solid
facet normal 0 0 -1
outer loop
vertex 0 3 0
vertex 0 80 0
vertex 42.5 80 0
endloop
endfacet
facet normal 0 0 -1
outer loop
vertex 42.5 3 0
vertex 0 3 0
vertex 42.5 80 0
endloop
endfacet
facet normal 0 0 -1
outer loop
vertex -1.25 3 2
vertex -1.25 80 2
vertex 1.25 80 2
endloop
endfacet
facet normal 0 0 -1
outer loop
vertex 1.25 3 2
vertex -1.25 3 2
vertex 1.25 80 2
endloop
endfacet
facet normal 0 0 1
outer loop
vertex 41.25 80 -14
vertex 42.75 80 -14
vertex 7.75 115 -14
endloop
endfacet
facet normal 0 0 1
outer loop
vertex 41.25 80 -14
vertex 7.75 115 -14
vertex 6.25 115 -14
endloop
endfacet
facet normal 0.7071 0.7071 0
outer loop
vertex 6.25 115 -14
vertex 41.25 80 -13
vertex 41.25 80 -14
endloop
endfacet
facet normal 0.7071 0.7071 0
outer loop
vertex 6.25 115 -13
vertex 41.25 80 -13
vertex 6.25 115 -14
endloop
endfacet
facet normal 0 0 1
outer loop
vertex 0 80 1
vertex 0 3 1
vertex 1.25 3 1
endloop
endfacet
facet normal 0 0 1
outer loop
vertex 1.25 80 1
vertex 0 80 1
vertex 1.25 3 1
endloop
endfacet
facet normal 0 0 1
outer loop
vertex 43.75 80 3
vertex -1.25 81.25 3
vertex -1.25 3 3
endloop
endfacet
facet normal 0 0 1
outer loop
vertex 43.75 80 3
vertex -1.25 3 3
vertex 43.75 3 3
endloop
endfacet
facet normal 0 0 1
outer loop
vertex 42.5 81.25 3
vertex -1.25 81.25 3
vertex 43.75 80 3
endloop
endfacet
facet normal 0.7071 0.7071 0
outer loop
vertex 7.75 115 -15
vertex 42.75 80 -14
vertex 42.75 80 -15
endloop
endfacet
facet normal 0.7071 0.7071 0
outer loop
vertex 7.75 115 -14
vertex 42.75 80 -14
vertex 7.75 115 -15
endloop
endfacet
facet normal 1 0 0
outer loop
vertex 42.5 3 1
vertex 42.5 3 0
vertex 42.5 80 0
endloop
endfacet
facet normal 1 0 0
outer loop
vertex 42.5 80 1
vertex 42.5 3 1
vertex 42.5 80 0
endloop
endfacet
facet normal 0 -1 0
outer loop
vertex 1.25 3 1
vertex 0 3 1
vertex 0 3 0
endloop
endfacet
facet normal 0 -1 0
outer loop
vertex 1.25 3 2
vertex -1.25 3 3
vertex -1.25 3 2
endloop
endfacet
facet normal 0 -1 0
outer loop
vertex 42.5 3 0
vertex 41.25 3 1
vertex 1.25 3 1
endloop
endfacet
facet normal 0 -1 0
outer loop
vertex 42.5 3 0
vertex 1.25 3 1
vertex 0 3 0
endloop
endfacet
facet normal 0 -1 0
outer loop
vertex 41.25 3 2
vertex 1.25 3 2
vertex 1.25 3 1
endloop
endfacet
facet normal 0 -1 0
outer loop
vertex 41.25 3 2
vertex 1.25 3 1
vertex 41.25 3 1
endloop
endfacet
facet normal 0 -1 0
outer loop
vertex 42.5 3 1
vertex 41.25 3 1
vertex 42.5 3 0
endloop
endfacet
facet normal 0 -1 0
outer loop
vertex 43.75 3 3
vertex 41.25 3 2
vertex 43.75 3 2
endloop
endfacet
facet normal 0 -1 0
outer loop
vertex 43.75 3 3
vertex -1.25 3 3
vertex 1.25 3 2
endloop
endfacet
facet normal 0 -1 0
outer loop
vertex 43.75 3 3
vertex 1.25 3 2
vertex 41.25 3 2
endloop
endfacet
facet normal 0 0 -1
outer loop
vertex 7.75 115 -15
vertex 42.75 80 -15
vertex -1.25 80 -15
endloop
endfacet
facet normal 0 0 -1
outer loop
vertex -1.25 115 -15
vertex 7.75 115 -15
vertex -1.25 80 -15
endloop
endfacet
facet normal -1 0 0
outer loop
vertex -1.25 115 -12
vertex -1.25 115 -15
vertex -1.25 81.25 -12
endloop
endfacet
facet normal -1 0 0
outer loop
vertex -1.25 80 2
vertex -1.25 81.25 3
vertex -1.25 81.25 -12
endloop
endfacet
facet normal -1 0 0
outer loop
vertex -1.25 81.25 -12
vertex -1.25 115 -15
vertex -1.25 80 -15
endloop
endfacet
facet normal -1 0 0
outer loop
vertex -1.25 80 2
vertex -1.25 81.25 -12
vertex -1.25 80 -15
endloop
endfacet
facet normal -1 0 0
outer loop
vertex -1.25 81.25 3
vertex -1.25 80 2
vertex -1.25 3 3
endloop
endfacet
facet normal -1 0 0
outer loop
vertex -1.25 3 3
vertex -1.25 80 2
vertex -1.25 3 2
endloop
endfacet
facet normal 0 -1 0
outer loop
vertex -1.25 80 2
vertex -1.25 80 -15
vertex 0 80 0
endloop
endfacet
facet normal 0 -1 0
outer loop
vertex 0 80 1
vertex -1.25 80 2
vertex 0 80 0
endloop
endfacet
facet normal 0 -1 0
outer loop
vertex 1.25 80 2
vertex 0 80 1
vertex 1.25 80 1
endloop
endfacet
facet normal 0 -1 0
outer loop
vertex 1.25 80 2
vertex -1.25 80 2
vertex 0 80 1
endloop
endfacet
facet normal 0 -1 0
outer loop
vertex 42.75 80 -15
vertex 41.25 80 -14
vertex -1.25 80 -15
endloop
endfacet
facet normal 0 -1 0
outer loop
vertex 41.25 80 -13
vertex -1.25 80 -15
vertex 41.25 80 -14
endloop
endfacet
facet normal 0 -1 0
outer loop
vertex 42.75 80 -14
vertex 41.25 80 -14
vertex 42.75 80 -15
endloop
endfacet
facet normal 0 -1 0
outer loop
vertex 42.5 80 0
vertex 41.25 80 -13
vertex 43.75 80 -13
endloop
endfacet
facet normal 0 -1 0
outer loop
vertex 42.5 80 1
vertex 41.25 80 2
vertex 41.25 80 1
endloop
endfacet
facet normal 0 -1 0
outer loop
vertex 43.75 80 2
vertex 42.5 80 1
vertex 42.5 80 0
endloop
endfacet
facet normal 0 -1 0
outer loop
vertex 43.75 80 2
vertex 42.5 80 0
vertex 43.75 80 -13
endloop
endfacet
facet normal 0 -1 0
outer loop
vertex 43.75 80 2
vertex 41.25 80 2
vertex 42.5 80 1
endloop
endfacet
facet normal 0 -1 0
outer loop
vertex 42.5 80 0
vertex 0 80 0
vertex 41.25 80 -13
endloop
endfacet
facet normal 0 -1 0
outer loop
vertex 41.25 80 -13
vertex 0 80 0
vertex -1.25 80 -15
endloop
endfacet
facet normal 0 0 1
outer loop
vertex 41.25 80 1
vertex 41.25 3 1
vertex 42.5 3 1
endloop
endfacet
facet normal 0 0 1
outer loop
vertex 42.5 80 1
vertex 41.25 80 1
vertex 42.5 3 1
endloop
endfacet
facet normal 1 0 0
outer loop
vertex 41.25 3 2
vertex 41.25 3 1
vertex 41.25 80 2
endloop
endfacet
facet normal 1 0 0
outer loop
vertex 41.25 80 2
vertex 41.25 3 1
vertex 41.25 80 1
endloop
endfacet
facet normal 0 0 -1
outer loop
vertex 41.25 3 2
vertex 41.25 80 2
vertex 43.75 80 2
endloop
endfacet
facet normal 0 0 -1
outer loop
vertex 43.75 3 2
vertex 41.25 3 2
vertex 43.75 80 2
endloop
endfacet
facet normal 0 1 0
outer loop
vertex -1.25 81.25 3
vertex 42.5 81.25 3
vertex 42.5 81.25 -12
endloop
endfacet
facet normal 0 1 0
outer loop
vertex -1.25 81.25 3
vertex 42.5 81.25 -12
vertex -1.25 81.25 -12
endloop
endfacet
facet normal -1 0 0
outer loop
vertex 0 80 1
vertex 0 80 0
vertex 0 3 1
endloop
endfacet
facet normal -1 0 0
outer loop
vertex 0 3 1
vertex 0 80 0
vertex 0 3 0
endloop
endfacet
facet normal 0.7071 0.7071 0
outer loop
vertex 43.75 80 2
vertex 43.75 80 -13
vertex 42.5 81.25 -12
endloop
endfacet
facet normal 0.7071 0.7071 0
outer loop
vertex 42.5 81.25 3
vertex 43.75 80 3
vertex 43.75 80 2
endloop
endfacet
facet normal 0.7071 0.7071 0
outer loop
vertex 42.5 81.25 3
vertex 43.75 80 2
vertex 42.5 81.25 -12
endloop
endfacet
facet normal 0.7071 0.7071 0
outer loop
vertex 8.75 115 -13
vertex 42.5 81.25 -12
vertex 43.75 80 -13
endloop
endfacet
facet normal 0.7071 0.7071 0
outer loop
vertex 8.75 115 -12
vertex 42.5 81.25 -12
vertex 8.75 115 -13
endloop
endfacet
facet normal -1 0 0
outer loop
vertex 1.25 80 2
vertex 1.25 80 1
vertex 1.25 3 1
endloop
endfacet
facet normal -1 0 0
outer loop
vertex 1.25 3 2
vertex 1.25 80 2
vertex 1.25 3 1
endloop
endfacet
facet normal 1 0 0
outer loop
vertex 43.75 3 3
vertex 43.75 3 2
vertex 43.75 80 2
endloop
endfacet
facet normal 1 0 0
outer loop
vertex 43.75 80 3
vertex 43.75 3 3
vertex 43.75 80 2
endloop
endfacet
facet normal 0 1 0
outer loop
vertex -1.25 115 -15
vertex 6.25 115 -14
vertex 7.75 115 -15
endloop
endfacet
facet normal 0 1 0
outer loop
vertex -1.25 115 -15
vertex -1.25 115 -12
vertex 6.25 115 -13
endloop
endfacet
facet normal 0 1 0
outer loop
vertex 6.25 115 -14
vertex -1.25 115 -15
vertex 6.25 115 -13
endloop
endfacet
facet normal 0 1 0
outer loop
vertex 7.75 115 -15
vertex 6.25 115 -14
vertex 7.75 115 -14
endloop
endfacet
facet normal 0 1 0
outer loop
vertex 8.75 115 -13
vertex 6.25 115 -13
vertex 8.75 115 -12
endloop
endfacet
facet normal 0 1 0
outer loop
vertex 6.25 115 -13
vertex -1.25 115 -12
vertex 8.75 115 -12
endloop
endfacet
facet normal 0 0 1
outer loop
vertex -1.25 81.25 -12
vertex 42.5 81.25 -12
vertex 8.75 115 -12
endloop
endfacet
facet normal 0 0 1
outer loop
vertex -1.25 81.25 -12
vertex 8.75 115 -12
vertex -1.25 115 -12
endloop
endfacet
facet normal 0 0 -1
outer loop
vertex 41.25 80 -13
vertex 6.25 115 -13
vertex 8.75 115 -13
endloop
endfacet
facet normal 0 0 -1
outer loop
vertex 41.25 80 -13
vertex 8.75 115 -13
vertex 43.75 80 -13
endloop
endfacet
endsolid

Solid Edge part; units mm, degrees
sketch "Sketch1" plane through (0, 0, 0) normal (0, 0, 1) x (1, 0, 0)
  line L0 (0, 0) -> (42.5, 0)
  line L1 (42.5, 0) -> (42.5, 80)
  line L2 (42.5, 80) -> (0, 80)
  line L3 (0, 80) -> (0, 0)
extrude "Protrusion1" add sketch "Sketch1" along normal blind 1
sketch "Sketch2" plane through (21.25, 40, 1) normal (0, 0, 1) x (1, 0, 0)
  line L0 (-20, 40) -> (-20, -40)
  line L1 (-20, -40) -> (20, -40)
  line L2 (20, -40) -> (20, 40)
  line L3 (20, 40) -> (-20, 40)
extrude "Vysunutí_2" add sketch "Sketch2" along normal blind 1
sketch "Sketch3" plane through (21.25, 40, 2) normal (0, 0, 1) x (1, 0, 0)
  line L0 (-22.5, -40) -> (22.5, -40)
  line L1 (22.5, -40) -> (22.5, 40)
  line L2 (22.5, 40) -> (-22.5, 40)
  line L3 (-22.5, 40) -> (-22.5, -40)
extrude "Vysunutí_3" add sketch "Sketch3" along normal blind 1
sketch "Sketch4" plane through (21.25, 40, 3) normal (0, 0, 1) x (1, 0, 0)
  line L0 (-22.5, 75) -> (-22.5, 40)
  line L1 (-22.5, 40) -> (22.5, 40)
  line L2 (22.5, 40) -> (-12.5, 75)
  line L3 (-22.5, 75) -> (-12.5, 75)
extrude "Protrusion2" add sketch "Sketch4" against normal blind 16
sketch "Sketch5" plane through (21.25, 57.5, 3) normal (0, 0, 1) x (0, -1, 0)
  line L0 (-23.75, 21.25) -> (-23.75, -22.5)
  line L1 (-23.75, -22.5) -> (-57.5, -22.5)
  line L2 (-57.5, -22.5) -> (-57.5, -12.5)
  line L3 (-57.5, -12.5) -> (-23.75, 21.25)
extrude "Cutout1" cut sketch "Sketch5" against normal blind 15
sketch "Sketch6" plane through (21.25, 97.5, -13) normal (0, 0, -1) x (0, -1, 0)
  line L0 (-15, 12.5) -> (-7.6278, 5.1278)
  line L1 (-7.6278, 5.1278) -> (16.25, -18.75)
  line L2 (17.5, -20) -> (16.25, -18.75)
  line L3 (17.5, 22.5) -> (17.5, -20)
  line L4 (16.25, 22.5) -> (17.5, 22.5)
  line L5 (16.25, 22.5) -> (-15, 22.5)
  line L6 (-17.5, 22.5) -> (-15, 22.5)
  line L7 (-17.5, 15) -> (-17.5, 22.5)
  line L8 (-15, 12.5) -> (-17.5, 15)
extrude "Vysunutí_6" add sketch "Sketch6" along normal blind 1
sketch "Sketch7" plane through (20, 96.25, -14) normal (0, 0, -1) x (-1, 0, 0)
  line L0 (21.25, 16.25) -> (21.25, 17.5)
  line L1 (21.25, 18.75) -> (21.25, 17.5)
  line L2 (12.25, 18.75) -> (21.25, 18.75)
  line L3 (11, 17.5) -> (12.25, 18.75)
  line L4 (9.75, 16.25) -> (11, 17.5)
  line L5 (9.75, 16.25) -> (-22.75, -16.25)
  line L6 (-22.75, -16.25) -> (-21.25, -16.25)
  line L7 (21.25, -16.25) -> (-21.25, -16.25)
  line L8 (21.25, 16.25) -> (21.25, -16.25)
extrude "Vysunutí_7" add sketch "Sketch7" along normal blind 1
sketch "Sketch8" plane through (21.25, 40.625, 3) normal (0, 0, 1) x (1, 0, 0)
  line L0 (22.5, -40.625) -> (-22.5, -40.625)
  line L1 (-22.5, -40.625) -> (-22.5, -37.625)
  line L2 (-22.5, -37.625) -> (22.5, -37.625)
  line L3 (22.5, -37.625) -> (22.5, -40.625)
extrude "Cutout2" cut sketch "Sketch8" against normal blind 3
